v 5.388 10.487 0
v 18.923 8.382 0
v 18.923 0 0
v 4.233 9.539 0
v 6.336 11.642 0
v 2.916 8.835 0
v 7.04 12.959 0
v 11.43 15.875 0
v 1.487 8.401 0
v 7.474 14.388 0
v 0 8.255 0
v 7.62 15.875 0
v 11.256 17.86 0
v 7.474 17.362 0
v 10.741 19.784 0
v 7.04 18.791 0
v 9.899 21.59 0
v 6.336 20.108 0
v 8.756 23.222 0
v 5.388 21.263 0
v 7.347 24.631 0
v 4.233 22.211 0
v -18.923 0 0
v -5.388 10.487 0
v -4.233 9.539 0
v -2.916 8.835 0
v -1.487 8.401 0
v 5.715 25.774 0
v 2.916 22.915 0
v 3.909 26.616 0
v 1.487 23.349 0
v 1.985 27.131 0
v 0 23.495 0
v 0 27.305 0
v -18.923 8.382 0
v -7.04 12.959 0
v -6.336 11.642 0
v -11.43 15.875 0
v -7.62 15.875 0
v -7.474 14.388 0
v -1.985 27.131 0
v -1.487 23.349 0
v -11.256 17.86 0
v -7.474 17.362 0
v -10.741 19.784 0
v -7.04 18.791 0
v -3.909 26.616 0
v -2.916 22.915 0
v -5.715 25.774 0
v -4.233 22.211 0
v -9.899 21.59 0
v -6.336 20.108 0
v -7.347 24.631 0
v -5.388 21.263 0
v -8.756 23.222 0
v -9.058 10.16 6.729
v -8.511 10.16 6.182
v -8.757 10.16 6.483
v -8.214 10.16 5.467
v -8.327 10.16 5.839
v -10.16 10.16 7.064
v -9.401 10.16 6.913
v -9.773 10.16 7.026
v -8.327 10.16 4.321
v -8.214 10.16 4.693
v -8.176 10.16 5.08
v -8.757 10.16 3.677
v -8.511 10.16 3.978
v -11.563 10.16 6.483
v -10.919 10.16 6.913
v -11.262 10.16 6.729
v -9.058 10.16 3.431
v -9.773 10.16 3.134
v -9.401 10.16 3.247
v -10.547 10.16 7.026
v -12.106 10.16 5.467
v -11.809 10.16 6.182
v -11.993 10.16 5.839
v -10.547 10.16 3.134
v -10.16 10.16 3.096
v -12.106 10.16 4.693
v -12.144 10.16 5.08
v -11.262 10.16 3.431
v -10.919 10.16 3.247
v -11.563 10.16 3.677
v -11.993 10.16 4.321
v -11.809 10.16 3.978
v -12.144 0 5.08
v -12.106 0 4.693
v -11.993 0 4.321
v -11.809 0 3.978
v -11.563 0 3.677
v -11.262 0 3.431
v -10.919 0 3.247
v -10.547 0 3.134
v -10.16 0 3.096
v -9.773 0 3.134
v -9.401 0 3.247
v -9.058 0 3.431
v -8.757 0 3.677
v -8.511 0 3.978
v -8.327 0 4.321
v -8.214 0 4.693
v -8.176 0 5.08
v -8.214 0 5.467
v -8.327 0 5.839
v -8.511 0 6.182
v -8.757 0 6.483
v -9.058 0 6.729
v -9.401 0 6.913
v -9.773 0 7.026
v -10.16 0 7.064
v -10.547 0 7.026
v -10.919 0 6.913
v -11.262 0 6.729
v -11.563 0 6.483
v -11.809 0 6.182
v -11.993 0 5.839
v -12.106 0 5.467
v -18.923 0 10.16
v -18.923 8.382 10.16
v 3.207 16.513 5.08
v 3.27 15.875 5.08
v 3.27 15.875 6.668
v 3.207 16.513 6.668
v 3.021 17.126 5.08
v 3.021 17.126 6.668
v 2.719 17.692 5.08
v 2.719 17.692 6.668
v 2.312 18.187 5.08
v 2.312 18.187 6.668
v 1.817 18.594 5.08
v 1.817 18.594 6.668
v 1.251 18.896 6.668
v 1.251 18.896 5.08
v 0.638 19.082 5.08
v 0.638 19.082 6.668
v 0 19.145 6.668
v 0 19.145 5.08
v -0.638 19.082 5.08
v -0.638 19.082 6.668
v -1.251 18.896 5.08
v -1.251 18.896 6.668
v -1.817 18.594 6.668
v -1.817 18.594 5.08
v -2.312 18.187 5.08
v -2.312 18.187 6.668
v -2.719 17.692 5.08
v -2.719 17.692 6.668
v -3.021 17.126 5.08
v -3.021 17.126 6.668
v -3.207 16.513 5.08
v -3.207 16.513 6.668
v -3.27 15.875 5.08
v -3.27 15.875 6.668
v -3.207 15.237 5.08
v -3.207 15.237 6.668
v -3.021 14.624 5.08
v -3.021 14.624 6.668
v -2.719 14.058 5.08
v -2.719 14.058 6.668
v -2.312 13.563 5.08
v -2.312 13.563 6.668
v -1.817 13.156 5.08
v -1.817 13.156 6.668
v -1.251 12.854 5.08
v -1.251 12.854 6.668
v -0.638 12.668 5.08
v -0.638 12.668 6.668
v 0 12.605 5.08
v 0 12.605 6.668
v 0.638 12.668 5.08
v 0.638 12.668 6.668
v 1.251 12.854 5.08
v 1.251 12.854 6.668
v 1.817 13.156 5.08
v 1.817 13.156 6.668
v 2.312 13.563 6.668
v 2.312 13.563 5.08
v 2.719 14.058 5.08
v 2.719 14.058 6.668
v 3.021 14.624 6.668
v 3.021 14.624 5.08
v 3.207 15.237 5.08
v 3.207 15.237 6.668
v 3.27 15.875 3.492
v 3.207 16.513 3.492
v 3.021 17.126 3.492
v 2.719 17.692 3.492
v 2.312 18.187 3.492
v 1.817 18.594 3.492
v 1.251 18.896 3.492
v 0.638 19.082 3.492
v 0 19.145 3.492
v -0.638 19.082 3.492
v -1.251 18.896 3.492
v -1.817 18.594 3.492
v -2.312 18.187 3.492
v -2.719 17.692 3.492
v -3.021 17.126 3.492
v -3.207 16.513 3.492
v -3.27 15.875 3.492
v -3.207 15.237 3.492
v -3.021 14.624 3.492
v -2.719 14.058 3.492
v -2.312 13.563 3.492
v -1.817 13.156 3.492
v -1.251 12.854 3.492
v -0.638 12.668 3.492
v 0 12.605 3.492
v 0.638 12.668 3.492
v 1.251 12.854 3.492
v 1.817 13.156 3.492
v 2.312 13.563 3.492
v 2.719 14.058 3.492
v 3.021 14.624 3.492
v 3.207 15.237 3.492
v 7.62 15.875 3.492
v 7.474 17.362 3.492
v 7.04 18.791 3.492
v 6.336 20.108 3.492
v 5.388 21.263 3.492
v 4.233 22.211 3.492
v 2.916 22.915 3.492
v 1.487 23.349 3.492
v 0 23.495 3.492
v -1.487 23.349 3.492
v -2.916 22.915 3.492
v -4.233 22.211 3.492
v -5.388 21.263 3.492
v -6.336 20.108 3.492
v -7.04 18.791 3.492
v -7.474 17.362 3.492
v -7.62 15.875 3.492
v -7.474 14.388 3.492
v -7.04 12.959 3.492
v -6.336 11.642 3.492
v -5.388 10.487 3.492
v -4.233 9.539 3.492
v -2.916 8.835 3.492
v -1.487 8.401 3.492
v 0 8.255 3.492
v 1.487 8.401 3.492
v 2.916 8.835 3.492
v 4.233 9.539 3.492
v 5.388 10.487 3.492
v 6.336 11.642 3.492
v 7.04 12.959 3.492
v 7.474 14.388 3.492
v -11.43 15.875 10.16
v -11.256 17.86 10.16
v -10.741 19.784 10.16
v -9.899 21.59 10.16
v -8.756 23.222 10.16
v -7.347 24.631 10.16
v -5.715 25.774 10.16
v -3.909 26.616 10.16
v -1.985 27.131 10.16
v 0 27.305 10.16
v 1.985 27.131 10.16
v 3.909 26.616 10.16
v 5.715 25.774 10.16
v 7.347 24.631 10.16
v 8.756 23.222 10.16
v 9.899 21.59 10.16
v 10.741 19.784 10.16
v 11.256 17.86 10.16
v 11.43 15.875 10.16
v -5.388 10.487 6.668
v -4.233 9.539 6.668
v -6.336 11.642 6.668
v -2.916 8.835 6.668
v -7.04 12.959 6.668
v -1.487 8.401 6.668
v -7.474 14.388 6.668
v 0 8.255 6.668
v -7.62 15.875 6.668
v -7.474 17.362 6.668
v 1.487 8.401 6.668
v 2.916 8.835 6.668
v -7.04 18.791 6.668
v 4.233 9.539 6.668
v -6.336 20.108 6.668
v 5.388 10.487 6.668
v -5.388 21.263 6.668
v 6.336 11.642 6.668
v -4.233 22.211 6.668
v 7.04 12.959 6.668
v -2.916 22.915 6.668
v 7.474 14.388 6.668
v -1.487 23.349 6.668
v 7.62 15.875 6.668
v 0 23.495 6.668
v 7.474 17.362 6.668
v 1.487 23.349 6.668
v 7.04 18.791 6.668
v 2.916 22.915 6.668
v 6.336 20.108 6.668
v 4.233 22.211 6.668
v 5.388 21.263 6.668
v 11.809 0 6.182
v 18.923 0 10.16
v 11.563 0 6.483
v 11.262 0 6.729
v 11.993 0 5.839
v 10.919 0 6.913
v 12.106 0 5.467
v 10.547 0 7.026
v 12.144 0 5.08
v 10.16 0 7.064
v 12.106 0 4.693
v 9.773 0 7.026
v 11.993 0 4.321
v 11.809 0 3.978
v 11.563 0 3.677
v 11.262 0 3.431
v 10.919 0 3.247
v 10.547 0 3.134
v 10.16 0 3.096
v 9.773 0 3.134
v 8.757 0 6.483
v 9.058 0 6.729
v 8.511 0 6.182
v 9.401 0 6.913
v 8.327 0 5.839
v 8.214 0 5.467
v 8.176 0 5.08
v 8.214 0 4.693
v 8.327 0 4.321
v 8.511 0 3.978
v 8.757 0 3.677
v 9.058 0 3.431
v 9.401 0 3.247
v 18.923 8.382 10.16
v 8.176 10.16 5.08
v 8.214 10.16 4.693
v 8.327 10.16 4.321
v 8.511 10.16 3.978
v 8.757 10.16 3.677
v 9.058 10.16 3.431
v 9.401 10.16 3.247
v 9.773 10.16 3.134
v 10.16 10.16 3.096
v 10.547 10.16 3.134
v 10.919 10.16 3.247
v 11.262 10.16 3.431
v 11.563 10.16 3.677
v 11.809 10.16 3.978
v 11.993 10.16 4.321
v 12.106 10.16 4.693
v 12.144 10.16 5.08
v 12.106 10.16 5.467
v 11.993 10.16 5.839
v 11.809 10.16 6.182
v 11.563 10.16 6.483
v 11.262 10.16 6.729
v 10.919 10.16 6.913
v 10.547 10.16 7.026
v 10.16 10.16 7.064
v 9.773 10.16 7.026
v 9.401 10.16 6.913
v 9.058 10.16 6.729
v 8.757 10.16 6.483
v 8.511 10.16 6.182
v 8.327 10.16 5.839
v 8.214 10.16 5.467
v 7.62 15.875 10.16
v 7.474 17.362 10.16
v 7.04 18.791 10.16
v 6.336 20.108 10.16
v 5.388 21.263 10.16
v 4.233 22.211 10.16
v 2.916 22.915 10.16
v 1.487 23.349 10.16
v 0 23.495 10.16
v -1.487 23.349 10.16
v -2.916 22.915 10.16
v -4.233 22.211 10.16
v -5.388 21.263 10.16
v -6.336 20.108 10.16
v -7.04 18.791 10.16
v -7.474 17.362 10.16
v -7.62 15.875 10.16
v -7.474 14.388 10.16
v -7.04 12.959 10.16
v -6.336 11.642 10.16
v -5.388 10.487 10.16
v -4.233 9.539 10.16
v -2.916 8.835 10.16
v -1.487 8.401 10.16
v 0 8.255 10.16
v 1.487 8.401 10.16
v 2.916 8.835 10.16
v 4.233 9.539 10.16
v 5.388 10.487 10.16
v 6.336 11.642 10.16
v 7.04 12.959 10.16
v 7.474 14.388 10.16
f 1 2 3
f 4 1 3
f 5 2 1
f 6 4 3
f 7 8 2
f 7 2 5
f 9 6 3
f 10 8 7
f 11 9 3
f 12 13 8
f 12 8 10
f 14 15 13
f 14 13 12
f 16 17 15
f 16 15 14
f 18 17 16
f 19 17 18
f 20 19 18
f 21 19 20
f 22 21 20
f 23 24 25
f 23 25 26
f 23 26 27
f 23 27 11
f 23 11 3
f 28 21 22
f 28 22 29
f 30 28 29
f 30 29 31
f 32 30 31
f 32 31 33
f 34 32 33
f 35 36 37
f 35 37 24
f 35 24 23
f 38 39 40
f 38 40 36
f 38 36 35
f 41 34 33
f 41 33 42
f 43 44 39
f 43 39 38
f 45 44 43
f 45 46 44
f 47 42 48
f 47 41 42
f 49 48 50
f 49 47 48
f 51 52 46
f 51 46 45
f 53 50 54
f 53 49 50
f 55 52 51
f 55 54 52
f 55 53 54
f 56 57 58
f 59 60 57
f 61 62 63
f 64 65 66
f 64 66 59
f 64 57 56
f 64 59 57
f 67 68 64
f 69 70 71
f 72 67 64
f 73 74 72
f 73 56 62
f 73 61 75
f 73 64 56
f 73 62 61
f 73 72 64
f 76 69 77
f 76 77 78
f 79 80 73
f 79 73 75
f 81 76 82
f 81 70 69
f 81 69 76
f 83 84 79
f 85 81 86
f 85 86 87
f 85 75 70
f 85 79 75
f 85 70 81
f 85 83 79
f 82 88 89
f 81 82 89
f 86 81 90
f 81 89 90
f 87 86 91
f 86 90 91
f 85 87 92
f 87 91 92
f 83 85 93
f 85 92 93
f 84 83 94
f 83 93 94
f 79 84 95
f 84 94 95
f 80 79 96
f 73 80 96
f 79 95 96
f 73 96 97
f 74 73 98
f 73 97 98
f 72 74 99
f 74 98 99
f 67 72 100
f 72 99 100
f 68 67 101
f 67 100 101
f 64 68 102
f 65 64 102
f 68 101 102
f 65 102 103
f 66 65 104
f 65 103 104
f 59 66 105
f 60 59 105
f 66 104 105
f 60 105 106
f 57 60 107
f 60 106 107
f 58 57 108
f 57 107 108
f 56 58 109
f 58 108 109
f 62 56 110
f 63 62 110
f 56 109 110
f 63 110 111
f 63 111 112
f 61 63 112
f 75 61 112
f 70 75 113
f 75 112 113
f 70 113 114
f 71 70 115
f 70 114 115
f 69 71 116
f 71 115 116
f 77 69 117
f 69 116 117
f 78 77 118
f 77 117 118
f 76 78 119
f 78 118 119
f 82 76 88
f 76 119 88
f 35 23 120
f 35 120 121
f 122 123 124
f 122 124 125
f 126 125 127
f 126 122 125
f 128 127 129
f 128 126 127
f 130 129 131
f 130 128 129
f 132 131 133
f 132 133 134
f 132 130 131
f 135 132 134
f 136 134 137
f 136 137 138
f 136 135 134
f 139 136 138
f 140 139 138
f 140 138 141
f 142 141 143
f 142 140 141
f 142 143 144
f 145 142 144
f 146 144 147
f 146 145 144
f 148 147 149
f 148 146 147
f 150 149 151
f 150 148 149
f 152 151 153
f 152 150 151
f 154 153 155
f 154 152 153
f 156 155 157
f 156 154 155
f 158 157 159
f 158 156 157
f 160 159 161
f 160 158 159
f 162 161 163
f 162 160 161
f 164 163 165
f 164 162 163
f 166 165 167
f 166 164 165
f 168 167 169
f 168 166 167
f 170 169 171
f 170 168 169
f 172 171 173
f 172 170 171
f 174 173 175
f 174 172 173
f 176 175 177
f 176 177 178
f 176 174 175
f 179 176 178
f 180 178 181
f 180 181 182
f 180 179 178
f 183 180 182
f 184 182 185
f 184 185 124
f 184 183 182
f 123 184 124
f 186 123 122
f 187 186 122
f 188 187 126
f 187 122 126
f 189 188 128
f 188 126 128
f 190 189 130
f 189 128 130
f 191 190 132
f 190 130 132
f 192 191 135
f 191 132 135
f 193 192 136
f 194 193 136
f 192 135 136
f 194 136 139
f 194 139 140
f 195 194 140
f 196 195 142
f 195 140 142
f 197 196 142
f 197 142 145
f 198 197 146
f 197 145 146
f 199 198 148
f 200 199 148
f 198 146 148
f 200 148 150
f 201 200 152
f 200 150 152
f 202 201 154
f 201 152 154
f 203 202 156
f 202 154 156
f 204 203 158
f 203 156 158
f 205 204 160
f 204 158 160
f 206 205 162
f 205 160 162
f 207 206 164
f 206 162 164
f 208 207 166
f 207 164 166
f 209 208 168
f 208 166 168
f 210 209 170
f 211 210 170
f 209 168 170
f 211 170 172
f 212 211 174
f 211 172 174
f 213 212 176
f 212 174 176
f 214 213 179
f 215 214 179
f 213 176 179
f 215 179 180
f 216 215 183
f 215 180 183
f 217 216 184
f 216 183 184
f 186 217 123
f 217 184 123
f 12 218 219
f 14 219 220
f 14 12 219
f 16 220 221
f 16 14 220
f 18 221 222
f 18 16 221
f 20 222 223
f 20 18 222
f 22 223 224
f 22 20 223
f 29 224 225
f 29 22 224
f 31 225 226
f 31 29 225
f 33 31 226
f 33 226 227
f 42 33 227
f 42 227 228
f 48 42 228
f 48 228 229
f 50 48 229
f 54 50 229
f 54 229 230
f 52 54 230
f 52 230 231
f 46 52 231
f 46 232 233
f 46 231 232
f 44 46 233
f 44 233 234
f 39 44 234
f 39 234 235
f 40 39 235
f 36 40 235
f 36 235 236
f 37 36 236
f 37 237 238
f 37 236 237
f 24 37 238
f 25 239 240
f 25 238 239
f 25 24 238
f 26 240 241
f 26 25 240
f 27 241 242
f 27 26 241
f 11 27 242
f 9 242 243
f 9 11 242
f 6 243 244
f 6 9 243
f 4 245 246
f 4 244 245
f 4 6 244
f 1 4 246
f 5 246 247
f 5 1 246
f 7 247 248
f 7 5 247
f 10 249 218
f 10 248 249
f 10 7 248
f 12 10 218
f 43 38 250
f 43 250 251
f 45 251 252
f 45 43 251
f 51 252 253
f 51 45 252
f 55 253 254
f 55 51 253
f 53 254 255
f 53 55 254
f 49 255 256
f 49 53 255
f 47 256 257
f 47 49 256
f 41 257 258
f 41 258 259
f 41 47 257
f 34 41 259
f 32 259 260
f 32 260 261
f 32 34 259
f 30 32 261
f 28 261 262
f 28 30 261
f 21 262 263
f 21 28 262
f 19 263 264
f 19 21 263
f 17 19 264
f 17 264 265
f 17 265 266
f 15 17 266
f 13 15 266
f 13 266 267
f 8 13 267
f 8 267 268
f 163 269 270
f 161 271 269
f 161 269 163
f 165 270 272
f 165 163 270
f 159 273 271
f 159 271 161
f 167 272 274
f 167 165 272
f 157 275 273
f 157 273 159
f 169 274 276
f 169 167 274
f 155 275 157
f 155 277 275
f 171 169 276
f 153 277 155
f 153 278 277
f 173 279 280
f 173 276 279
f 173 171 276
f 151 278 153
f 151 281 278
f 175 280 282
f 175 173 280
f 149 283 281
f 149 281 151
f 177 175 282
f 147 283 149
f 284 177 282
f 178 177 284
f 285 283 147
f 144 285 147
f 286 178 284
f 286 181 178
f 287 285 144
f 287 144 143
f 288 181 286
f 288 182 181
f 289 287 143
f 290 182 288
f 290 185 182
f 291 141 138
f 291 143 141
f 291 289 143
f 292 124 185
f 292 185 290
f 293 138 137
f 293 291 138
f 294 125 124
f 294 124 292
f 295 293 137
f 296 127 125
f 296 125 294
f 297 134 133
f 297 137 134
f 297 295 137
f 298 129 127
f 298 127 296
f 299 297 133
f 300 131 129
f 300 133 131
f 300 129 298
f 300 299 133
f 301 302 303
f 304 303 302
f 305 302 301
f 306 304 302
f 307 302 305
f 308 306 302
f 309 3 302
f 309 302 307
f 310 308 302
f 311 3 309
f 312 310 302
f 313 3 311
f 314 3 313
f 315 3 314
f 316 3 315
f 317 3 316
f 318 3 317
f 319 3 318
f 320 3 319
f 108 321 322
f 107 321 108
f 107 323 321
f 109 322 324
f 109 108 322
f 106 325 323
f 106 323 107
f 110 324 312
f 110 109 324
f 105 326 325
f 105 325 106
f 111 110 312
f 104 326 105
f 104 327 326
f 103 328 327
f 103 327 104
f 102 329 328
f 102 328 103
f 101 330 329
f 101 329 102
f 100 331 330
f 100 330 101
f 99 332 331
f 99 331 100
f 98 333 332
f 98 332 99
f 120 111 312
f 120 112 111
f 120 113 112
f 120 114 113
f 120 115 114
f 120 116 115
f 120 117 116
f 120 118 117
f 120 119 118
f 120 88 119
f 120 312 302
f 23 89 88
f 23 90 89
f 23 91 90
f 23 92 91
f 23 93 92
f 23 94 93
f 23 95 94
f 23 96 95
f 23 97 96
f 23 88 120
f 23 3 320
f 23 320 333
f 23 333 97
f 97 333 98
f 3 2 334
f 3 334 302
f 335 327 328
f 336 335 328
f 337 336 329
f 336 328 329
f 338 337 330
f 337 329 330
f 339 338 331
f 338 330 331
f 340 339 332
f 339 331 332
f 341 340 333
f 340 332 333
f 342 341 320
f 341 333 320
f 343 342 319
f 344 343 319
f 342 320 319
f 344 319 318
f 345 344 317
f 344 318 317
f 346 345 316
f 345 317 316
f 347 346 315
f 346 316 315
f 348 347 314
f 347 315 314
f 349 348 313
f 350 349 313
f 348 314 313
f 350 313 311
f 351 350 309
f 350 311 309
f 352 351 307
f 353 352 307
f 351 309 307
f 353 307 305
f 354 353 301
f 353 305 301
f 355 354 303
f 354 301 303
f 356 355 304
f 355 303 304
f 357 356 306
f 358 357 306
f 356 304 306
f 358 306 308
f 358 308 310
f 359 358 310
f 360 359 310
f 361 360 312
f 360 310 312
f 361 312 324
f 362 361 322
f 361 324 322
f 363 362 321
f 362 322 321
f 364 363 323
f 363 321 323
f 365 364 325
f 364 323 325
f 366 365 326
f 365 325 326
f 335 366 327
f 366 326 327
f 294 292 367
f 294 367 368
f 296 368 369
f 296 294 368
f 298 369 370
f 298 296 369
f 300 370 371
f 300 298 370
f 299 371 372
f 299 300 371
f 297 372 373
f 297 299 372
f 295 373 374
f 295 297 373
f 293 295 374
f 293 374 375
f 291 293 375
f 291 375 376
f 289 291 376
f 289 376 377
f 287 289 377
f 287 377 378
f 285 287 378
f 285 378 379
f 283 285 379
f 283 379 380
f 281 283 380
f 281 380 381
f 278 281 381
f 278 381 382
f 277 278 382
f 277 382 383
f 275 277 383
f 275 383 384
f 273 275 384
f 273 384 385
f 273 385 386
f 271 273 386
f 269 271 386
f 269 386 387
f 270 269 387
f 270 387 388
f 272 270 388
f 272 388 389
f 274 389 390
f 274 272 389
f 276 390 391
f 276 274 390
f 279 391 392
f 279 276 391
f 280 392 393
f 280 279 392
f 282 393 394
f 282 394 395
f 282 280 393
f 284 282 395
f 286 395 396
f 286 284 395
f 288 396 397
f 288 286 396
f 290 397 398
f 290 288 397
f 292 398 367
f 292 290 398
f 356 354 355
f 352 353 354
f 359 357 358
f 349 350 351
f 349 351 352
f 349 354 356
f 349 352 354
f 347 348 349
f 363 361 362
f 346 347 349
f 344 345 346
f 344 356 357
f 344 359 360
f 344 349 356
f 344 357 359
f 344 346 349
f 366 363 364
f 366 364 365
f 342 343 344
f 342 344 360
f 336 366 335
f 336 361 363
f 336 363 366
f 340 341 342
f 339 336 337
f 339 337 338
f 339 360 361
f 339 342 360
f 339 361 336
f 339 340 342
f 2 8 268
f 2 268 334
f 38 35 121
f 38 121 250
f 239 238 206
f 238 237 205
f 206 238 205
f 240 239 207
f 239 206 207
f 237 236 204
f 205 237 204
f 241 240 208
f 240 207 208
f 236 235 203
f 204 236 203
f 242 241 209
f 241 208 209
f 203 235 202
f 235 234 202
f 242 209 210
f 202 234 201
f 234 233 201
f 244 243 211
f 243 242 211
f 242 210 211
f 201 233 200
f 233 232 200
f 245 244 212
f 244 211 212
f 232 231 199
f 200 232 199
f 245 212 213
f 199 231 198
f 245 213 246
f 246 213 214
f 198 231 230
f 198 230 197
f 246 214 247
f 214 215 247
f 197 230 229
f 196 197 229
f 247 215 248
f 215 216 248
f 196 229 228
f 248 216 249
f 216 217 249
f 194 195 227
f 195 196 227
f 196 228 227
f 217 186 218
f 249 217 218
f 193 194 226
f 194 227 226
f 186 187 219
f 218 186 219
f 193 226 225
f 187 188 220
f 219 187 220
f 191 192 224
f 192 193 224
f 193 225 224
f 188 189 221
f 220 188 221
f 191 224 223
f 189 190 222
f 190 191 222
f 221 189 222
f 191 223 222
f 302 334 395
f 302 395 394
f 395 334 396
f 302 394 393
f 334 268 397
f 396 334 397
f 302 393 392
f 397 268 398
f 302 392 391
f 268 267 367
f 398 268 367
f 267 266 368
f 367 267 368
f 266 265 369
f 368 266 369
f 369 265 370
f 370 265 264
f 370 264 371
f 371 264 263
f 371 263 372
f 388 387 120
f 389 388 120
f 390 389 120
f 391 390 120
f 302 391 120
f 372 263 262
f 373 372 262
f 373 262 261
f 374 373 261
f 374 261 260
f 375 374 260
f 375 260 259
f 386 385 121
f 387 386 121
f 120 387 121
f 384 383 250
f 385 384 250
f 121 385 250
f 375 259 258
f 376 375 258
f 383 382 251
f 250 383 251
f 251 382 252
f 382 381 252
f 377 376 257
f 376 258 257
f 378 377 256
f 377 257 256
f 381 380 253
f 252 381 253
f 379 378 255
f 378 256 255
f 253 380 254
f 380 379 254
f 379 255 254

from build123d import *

# Parameters (mm, degrees)
SKETCH1_R                = 7.62
BOSS_EXTRUDE1_DEPTH      = 10.16
SKETCH3_R                = 8.7376
SKETCH3_R_2              = 3.27025
BOSS_EXTRUDE2_DEPTH      = 1.5875
BOSS_EXTRUDE2_DEPTH_BACK = 1.5875
SKETCH4_R                = 1.98374
CUT_EXTRUDE1_DEPTH       = 10.16


with BuildPart() as part:
    # Sketch1 → Boss-Extrude1 (new body)
    with BuildSketch(Plane.XY):
        with BuildLine():
            Line((0, 0), (-18.923, 0))
            Line((-18.923, 0), (-18.923, 8.382))
            Line((-18.923, 8.382), (-11.43, 15.875))
            ThreePointArc((-11.43, 15.875), (0, 27.305), (11.43, 15.875))
            Line((11.43, 15.875), (18.923, 8.382))
            Line((18.923, 8.382), (18.923, 0))
            Line((18.923, 0), (0, 0))
        make_face()
        with Locations((0, 15.875)):
            Circle(SKETCH1_R, mode=Mode.SUBTRACT)
    extrude(amount=BOSS_EXTRUDE1_DEPTH)

    # Sketch3 → Boss-Extrude2 (add, two sides)
    with BuildSketch(Plane.XY.offset(5.08)) as boss_extrude2_sk:
        with Locations((0, 15.875)):
            Circle(SKETCH3_R)
        with Locations((0, 15.875)):
            Circle(SKETCH3_R_2, mode=Mode.SUBTRACT)
    extrude(amount=BOSS_EXTRUDE2_DEPTH)
    extrude(boss_extrude2_sk.sketch, amount=-BOSS_EXTRUDE2_DEPTH_BACK)

    # Sketch4 → Cut-Extrude1 (cut)
    with BuildSketch(Plane(origin=(0, 0, 0), x_dir=(-1, 0, 0), z_dir=(0, -1, 0))):
        with Locations((-10.16, -5.08)):
            Circle(SKETCH4_R)
        with Locations((10.16, -5.08)):
            Circle(SKETCH4_R)
    extrude(amount=-CUT_EXTRUDE1_DEPTH, mode=Mode.SUBTRACT)


solid = part.part
